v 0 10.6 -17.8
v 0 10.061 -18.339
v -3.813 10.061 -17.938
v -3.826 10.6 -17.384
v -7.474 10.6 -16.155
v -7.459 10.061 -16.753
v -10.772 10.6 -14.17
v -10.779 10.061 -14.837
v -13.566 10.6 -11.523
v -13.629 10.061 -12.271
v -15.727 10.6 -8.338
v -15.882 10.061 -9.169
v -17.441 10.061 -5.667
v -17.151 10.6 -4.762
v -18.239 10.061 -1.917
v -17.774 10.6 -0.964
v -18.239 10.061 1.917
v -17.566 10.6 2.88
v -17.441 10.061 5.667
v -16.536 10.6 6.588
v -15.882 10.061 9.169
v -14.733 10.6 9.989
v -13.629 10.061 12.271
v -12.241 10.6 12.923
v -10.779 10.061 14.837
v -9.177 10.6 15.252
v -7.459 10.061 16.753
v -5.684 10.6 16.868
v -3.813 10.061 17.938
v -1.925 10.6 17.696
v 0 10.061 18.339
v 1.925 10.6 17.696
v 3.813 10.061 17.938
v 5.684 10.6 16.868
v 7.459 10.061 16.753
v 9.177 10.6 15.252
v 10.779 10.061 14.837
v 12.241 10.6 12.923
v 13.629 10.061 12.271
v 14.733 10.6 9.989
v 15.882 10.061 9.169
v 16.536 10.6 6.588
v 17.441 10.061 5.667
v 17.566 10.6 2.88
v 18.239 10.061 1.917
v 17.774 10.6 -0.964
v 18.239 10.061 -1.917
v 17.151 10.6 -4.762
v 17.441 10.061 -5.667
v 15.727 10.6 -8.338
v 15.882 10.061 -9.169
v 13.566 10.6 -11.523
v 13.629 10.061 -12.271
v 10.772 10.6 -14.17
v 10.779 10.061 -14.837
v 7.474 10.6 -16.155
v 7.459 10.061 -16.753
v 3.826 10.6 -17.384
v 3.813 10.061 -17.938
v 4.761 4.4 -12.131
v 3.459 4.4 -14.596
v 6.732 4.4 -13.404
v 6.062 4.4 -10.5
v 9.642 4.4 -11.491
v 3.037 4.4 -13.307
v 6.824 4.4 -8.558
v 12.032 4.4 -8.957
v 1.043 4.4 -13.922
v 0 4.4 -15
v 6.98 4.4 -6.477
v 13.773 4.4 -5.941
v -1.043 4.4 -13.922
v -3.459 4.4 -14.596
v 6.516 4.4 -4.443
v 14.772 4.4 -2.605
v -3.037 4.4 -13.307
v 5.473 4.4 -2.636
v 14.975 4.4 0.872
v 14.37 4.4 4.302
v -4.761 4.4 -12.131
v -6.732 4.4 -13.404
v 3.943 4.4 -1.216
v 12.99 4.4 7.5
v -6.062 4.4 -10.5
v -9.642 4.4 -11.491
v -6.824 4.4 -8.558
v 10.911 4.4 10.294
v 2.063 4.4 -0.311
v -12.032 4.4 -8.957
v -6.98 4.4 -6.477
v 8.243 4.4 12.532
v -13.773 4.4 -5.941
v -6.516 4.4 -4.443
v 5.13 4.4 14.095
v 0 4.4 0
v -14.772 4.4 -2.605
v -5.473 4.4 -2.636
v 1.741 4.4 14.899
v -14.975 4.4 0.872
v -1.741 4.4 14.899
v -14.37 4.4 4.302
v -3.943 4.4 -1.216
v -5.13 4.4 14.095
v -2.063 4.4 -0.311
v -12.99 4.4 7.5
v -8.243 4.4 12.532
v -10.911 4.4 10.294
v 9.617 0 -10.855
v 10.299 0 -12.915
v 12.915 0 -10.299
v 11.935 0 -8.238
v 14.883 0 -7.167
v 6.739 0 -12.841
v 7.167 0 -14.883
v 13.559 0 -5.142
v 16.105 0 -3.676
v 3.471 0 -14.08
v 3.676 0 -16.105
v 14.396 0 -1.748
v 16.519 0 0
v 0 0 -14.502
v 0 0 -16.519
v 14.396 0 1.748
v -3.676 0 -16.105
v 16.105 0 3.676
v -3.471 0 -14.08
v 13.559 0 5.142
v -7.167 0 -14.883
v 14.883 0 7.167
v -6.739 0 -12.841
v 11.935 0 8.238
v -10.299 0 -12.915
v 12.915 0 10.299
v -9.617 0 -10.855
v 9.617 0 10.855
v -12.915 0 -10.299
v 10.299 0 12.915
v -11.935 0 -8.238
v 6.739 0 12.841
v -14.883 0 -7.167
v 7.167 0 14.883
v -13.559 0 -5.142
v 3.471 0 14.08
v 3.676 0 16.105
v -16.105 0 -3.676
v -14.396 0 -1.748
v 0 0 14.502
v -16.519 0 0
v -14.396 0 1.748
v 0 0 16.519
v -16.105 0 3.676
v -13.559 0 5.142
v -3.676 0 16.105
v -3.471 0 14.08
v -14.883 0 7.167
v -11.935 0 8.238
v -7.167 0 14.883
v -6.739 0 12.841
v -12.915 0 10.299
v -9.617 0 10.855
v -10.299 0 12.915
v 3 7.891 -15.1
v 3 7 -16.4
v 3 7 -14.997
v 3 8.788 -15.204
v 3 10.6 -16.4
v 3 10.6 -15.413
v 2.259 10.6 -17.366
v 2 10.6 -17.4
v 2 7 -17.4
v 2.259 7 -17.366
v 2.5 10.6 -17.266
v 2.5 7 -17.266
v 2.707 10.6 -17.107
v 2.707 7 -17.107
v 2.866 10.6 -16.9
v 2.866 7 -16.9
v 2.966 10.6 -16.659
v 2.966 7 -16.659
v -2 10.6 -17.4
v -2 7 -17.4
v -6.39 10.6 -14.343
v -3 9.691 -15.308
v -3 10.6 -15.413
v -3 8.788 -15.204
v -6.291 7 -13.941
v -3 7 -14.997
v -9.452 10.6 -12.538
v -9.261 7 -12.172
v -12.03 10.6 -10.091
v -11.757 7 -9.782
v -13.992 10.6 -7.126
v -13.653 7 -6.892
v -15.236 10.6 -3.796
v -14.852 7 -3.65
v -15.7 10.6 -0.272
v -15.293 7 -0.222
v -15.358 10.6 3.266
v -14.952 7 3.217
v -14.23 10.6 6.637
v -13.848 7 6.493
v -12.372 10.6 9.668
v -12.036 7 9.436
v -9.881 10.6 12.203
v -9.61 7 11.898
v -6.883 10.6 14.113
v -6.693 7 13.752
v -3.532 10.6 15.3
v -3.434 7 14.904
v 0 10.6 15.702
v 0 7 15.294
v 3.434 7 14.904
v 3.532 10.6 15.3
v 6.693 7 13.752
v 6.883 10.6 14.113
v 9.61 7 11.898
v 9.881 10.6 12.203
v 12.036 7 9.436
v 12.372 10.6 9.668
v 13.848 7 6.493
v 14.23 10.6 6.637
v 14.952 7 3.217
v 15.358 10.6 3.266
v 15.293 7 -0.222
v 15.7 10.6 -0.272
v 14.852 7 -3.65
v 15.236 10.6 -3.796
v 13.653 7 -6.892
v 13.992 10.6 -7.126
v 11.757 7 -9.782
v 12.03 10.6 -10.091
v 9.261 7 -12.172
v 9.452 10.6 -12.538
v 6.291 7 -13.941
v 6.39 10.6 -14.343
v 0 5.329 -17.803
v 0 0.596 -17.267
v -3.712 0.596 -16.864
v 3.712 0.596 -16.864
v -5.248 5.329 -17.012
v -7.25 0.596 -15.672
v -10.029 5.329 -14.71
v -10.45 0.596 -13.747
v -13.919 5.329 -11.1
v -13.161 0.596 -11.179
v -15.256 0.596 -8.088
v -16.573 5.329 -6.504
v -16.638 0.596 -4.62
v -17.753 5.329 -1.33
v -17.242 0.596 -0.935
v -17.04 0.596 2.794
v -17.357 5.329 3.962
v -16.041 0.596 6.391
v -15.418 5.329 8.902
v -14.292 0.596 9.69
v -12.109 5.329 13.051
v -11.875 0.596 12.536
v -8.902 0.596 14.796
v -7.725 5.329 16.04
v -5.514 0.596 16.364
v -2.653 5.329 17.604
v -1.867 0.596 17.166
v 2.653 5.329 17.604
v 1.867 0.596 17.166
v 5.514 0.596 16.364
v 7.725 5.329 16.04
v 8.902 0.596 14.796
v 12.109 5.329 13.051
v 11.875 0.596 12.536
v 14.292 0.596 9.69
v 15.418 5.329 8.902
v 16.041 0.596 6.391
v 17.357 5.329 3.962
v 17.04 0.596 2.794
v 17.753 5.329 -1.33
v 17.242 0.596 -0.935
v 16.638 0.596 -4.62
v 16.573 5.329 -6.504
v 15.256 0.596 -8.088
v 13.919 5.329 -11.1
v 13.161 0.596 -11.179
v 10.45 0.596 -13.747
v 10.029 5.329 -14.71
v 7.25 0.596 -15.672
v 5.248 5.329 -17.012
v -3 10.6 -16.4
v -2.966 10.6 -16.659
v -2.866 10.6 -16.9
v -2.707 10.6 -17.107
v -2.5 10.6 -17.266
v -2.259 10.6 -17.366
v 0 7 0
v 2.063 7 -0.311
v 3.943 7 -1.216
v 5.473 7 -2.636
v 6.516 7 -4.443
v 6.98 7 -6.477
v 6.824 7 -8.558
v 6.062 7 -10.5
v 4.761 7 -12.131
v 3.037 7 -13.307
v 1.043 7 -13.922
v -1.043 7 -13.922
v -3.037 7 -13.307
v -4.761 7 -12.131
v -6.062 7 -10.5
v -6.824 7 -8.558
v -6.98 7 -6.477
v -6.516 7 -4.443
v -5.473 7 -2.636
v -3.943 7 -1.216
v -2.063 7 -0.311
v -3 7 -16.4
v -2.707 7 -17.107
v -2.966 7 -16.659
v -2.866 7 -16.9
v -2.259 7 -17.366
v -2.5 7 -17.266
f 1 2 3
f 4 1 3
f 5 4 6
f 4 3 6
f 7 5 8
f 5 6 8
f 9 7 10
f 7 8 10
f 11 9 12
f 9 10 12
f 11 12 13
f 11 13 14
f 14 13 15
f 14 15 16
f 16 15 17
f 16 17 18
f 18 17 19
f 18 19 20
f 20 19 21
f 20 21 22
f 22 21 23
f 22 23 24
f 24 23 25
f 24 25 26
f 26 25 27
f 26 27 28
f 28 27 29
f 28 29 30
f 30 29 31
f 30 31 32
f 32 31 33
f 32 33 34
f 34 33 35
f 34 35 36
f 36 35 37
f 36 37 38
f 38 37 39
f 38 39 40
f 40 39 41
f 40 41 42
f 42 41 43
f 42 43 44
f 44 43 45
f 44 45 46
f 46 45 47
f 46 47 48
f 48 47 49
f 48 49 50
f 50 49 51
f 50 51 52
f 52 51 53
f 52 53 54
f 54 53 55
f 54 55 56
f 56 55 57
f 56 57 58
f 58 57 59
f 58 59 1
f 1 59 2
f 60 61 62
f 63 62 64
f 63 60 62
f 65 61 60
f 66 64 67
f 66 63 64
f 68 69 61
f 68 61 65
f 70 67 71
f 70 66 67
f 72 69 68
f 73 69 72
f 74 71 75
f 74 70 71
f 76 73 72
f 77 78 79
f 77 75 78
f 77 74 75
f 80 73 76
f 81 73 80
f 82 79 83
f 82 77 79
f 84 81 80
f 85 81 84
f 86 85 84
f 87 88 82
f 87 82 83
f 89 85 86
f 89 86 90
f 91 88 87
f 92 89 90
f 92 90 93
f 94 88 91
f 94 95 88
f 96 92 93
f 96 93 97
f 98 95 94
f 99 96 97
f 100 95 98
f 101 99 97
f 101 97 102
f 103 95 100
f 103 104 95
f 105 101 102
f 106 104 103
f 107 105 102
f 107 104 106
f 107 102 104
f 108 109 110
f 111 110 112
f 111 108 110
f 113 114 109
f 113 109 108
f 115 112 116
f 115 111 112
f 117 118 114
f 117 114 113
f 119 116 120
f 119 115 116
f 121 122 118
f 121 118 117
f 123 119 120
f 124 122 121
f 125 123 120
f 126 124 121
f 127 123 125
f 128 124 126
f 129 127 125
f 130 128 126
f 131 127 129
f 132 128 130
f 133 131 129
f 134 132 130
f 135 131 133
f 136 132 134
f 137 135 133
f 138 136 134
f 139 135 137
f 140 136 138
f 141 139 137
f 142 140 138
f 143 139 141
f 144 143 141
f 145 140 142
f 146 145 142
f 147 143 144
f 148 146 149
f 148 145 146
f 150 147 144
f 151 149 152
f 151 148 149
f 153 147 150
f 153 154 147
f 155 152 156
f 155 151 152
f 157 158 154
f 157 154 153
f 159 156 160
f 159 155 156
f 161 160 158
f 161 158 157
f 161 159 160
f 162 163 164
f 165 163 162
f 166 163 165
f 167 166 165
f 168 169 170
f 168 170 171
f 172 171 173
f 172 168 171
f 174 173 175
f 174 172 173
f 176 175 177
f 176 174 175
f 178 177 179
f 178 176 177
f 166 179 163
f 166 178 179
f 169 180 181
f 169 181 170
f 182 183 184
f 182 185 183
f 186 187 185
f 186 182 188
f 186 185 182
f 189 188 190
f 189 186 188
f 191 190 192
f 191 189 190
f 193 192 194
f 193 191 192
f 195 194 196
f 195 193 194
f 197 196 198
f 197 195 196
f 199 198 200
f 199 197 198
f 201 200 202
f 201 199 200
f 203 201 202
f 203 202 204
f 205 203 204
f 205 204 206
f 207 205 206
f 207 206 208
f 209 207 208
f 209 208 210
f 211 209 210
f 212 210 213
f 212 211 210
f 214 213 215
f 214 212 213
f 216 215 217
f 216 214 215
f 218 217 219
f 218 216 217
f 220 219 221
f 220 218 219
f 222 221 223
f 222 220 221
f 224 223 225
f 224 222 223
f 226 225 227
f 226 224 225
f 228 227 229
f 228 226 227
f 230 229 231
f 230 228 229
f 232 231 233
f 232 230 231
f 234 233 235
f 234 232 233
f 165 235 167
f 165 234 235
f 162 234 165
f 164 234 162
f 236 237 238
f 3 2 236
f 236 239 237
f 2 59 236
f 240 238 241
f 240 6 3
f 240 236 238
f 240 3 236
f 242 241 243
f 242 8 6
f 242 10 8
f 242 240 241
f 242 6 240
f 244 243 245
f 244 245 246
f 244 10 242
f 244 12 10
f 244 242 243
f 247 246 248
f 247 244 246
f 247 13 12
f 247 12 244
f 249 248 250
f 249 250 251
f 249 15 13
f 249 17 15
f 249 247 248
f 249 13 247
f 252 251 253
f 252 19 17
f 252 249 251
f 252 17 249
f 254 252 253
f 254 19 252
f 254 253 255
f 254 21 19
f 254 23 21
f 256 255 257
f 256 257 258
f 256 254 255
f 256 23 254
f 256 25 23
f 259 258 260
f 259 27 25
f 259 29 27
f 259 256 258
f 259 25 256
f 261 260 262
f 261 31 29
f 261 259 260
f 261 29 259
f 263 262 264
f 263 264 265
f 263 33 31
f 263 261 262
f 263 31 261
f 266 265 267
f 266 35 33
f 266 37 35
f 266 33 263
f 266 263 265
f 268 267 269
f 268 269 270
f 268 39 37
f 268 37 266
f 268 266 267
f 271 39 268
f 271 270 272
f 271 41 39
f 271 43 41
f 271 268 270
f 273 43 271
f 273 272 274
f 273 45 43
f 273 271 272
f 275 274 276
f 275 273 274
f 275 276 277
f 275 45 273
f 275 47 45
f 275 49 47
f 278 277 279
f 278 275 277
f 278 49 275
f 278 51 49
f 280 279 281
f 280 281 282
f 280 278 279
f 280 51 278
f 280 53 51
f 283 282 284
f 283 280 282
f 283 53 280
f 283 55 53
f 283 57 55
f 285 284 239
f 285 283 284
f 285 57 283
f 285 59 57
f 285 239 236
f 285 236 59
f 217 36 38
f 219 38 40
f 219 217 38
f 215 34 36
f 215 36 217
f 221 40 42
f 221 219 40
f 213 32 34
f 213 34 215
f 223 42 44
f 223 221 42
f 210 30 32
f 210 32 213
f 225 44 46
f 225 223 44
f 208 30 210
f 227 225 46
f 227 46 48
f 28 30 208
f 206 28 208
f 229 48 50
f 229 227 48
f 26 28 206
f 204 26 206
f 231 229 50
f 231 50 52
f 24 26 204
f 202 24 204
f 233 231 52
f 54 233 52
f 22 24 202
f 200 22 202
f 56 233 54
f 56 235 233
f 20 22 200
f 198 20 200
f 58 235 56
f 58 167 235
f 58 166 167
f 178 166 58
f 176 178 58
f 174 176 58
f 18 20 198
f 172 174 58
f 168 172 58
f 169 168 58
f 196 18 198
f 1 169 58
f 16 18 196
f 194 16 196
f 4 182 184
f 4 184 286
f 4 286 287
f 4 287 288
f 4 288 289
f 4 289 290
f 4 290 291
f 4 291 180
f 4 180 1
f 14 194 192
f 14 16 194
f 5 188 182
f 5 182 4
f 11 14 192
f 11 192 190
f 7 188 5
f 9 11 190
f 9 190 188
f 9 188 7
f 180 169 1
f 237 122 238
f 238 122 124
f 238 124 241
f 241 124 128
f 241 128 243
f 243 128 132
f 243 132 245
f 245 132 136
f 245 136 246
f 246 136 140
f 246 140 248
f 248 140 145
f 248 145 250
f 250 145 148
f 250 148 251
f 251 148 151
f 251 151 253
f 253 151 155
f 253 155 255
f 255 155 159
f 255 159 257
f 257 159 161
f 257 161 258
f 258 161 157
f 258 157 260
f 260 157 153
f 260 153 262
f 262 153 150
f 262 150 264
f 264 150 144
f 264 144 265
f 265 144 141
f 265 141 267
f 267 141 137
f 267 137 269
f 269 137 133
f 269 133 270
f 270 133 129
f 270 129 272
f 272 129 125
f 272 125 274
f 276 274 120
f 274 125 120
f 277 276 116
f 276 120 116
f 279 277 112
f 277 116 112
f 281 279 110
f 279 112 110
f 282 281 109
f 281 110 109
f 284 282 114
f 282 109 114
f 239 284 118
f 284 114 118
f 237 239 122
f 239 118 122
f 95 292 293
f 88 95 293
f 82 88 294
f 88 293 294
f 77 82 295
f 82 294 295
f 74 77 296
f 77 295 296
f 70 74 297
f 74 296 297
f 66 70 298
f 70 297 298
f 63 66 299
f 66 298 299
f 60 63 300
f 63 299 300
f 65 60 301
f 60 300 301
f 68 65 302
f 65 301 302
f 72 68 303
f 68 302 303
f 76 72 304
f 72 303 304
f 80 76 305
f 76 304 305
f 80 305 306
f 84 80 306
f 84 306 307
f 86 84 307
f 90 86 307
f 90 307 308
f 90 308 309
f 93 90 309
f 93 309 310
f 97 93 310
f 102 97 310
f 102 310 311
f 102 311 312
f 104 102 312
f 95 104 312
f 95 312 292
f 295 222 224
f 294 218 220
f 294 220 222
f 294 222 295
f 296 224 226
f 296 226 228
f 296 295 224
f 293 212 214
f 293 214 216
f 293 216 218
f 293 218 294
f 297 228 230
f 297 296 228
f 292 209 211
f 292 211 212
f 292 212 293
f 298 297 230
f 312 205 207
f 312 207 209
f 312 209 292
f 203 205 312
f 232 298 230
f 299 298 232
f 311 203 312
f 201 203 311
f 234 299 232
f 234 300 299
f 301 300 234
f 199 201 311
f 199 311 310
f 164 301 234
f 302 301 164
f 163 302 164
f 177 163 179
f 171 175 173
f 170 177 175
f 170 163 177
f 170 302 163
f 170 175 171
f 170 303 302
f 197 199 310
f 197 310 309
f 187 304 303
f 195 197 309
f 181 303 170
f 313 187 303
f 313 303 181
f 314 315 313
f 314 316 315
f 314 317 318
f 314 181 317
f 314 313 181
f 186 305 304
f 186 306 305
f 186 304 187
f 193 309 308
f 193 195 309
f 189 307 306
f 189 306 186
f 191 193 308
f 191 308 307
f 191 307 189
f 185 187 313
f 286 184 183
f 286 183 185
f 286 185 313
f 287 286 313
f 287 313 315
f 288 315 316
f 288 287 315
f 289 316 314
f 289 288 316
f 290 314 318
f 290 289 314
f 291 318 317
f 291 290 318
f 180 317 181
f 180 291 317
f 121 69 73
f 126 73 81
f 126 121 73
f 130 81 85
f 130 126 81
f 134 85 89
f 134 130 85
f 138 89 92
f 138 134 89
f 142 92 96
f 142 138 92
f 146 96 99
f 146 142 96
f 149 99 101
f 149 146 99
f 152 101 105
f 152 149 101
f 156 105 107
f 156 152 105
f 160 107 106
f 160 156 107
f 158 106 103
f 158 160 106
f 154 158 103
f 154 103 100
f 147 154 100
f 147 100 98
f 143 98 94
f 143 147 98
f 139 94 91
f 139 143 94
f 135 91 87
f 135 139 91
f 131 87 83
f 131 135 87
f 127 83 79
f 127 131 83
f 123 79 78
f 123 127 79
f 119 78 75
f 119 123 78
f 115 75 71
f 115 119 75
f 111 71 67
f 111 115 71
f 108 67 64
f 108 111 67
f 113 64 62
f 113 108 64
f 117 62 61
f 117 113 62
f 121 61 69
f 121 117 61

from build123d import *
from OCP.BRepFilletAPI import BRepFilletAPI_MakeChamfer

# Parameters (mm, degrees)
CUT_EXTRUDE1_DEPTH = 28.123421613
SKETCH3_R          = 2
CUT_EXTRUDE2_DEPTH = 2
SKETCH8_R          = 25.2248299
CUT_EXTRUDE4_DEPTH = 12
SKETCH11_R         = 7
CUT_EXTRUDE6_DEPTH = 27.946613887
CUT_EXTRUDE7_DEPTH = 3.6
CHAMFER1_SIZE      = 0.6
CHAMFER1_SIZE2     = 0.68091755
CHAMFER1_SIZE2_2   = 0.542425845


with BuildPart() as part:
    # Sketch1 → Revolve1 (revolve)
    with BuildSketch(Plane.XY, mode=Mode.PRIVATE) as revolve1_sk:
        Polygon((0, 0), (-17.2, 0), (-15.1, -12), (0, -12), align=None)
    revolve(revolve1_sk.sketch.rotate(Axis((0, 0, 0), (0, -1, 0)), 270), axis=Axis((0, 0, 0), (0, -1, 0)))

    # Sketch2 → Cut-Extrude1 (cut, through all)
    with BuildSketch(Plane(origin=(0, 0, 0), x_dir=(1, 0, 0), z_dir=(0, 1, 0))):
        with BuildLine():
            Line((-9.1, -5.8), (-7.3, -5.8))
            Line((-7.3, -5.8), (-7.3, -10.756858277))
            ThreePointArc((-7.3, -10.756858277), (0, -13), (7.3, -10.756858277))
            Line((7.3, -10.756858277), (7.3, -5.8))
            Line((7.3, -5.8), (9.1, -5.8))
            Line((9.1, -5.8), (9.1, -4))
            Line((9.1, -4), (7.3, -4))
            Line((7.3, -4), (7.3, 0))
            Line((7.3, 0), (13, 0))
            ThreePointArc((13, 0), (0, 13), (-13, 0))
            Line((-13, 0), (-7.3, 0))
            Line((-7.3, 0), (-7.3, -4))
            Line((-7.3, -4), (-9.1, -4))
            Line((-9.1, -4), (-9.1, -5.8))
        make_face()
    extrude(amount=-CUT_EXTRUDE1_DEPTH, mode=Mode.SUBTRACT)

    # Sketch3 → Cut-Extrude2 (cut)
    with BuildSketch(Plane(origin=(0, 0, 0), x_dir=(1, 0, 0), z_dir=(0, 1, 0))):
        with Locations((-8.1, -4.9)):
            Circle(SKETCH3_R)
        with Locations((8.1, -4.9)):
            Circle(SKETCH3_R)
    extrude(amount=-CUT_EXTRUDE2_DEPTH, mode=Mode.SUBTRACT)

    # Sketch8 → Cut-Extrude4 (cut)
    with BuildSketch(Plane.XZ.offset(12)):
        Circle(SKETCH8_R)
    extrude(amount=-CUT_EXTRUDE4_DEPTH, mode=Mode.SUBTRACT)


with BuildPart() as body_2:
    # Sketch6 → Revolve2 (revolve)
    with BuildSketch(Plane(origin=(0, 0, 0), x_dir=(0, 0, -1), z_dir=(1, 0, 0))):
        Polygon((17.2, 0), (18.4, 10.6), (15.701886792, 10.6), (15.294339623, 7), (0, 7), (0, 4.4), (15, 4.4), (14.501886792, 0), align=None)
    revolve(axis=Axis((0, 4.4, 0), (0, 1, 0)))

    # Sketch11 → Cut-Extrude6 (cut, through all)
    with BuildSketch(Plane(origin=(0, 7, 0), x_dir=(1, 0, 0), z_dir=(0, 1, 0))):
        with Locations(Location((0, 7, 0), (0, 0, 270))):
            Circle(SKETCH11_R)
    extrude(amount=-CUT_EXTRUDE6_DEPTH, mode=Mode.SUBTRACT)

    # Sketch12 → Cut-Extrude7 (cut)
    with BuildSketch(Plane(origin=(0, 10.6, 0), x_dir=(1, 0, 0), z_dir=(0, 1, 0))):
        with BuildLine():
            Line((3, 16.4), (3, 14.788468719))
            Line((3, 14.788468719), (-3, 14.788468719))
            Line((-3, 14.788468719), (-3, 16.4))
            ThreePointArc((-3, 16.4), (-2.707106781, 17.107106781), (-2, 17.4))
            Line((-2, 17.4), (2, 17.4))
            ThreePointArc((2, 17.4), (2.707106781, 17.107106781), (3, 16.4))
        make_face()
    extrude(amount=-CUT_EXTRUDE7_DEPTH, mode=Mode.SUBTRACT)

    # Chamfer1: one chamfer whose edges measure the first distance from different faces: ONE call of the kernel's chamfer builder (chamfer() names one face for all edges)
    chamfer1_edges_1 = [body_2.edges().sort_by_distance(p)[0] for p in [
        (0, 0, 17.2),
    ]]
    chamfer1_side_1 = [body_2.faces().sort_by_distance(p)[0] for p in [
        (0, 5.3, 17.8),
    ]]
    chamfer1_edges_2 = [body_2.edges().sort_by_distance(p)[0] for p in [
        (0, 10.6, 18.4),
    ]]
    chamfer1_side_2 = [body_2.faces().sort_by_distance(p)[0] for p in [
        (0, 10.6, 17.879569409),
    ]]
    chamfer1 = BRepFilletAPI_MakeChamfer(body_2.part.solid().wrapped)
    for e in chamfer1_edges_1:
        chamfer1.Add(CHAMFER1_SIZE, CHAMFER1_SIZE2, e.wrapped, chamfer1_side_1[0].wrapped)  # the first distance lies on this face
    for e in chamfer1_edges_2:
        chamfer1.Add(CHAMFER1_SIZE, CHAMFER1_SIZE2_2, e.wrapped, chamfer1_side_2[0].wrapped)  # the first distance lies on this face
    add(Compound.cast(chamfer1.Shape()), mode=Mode.REPLACE)


solid = body_2.part
